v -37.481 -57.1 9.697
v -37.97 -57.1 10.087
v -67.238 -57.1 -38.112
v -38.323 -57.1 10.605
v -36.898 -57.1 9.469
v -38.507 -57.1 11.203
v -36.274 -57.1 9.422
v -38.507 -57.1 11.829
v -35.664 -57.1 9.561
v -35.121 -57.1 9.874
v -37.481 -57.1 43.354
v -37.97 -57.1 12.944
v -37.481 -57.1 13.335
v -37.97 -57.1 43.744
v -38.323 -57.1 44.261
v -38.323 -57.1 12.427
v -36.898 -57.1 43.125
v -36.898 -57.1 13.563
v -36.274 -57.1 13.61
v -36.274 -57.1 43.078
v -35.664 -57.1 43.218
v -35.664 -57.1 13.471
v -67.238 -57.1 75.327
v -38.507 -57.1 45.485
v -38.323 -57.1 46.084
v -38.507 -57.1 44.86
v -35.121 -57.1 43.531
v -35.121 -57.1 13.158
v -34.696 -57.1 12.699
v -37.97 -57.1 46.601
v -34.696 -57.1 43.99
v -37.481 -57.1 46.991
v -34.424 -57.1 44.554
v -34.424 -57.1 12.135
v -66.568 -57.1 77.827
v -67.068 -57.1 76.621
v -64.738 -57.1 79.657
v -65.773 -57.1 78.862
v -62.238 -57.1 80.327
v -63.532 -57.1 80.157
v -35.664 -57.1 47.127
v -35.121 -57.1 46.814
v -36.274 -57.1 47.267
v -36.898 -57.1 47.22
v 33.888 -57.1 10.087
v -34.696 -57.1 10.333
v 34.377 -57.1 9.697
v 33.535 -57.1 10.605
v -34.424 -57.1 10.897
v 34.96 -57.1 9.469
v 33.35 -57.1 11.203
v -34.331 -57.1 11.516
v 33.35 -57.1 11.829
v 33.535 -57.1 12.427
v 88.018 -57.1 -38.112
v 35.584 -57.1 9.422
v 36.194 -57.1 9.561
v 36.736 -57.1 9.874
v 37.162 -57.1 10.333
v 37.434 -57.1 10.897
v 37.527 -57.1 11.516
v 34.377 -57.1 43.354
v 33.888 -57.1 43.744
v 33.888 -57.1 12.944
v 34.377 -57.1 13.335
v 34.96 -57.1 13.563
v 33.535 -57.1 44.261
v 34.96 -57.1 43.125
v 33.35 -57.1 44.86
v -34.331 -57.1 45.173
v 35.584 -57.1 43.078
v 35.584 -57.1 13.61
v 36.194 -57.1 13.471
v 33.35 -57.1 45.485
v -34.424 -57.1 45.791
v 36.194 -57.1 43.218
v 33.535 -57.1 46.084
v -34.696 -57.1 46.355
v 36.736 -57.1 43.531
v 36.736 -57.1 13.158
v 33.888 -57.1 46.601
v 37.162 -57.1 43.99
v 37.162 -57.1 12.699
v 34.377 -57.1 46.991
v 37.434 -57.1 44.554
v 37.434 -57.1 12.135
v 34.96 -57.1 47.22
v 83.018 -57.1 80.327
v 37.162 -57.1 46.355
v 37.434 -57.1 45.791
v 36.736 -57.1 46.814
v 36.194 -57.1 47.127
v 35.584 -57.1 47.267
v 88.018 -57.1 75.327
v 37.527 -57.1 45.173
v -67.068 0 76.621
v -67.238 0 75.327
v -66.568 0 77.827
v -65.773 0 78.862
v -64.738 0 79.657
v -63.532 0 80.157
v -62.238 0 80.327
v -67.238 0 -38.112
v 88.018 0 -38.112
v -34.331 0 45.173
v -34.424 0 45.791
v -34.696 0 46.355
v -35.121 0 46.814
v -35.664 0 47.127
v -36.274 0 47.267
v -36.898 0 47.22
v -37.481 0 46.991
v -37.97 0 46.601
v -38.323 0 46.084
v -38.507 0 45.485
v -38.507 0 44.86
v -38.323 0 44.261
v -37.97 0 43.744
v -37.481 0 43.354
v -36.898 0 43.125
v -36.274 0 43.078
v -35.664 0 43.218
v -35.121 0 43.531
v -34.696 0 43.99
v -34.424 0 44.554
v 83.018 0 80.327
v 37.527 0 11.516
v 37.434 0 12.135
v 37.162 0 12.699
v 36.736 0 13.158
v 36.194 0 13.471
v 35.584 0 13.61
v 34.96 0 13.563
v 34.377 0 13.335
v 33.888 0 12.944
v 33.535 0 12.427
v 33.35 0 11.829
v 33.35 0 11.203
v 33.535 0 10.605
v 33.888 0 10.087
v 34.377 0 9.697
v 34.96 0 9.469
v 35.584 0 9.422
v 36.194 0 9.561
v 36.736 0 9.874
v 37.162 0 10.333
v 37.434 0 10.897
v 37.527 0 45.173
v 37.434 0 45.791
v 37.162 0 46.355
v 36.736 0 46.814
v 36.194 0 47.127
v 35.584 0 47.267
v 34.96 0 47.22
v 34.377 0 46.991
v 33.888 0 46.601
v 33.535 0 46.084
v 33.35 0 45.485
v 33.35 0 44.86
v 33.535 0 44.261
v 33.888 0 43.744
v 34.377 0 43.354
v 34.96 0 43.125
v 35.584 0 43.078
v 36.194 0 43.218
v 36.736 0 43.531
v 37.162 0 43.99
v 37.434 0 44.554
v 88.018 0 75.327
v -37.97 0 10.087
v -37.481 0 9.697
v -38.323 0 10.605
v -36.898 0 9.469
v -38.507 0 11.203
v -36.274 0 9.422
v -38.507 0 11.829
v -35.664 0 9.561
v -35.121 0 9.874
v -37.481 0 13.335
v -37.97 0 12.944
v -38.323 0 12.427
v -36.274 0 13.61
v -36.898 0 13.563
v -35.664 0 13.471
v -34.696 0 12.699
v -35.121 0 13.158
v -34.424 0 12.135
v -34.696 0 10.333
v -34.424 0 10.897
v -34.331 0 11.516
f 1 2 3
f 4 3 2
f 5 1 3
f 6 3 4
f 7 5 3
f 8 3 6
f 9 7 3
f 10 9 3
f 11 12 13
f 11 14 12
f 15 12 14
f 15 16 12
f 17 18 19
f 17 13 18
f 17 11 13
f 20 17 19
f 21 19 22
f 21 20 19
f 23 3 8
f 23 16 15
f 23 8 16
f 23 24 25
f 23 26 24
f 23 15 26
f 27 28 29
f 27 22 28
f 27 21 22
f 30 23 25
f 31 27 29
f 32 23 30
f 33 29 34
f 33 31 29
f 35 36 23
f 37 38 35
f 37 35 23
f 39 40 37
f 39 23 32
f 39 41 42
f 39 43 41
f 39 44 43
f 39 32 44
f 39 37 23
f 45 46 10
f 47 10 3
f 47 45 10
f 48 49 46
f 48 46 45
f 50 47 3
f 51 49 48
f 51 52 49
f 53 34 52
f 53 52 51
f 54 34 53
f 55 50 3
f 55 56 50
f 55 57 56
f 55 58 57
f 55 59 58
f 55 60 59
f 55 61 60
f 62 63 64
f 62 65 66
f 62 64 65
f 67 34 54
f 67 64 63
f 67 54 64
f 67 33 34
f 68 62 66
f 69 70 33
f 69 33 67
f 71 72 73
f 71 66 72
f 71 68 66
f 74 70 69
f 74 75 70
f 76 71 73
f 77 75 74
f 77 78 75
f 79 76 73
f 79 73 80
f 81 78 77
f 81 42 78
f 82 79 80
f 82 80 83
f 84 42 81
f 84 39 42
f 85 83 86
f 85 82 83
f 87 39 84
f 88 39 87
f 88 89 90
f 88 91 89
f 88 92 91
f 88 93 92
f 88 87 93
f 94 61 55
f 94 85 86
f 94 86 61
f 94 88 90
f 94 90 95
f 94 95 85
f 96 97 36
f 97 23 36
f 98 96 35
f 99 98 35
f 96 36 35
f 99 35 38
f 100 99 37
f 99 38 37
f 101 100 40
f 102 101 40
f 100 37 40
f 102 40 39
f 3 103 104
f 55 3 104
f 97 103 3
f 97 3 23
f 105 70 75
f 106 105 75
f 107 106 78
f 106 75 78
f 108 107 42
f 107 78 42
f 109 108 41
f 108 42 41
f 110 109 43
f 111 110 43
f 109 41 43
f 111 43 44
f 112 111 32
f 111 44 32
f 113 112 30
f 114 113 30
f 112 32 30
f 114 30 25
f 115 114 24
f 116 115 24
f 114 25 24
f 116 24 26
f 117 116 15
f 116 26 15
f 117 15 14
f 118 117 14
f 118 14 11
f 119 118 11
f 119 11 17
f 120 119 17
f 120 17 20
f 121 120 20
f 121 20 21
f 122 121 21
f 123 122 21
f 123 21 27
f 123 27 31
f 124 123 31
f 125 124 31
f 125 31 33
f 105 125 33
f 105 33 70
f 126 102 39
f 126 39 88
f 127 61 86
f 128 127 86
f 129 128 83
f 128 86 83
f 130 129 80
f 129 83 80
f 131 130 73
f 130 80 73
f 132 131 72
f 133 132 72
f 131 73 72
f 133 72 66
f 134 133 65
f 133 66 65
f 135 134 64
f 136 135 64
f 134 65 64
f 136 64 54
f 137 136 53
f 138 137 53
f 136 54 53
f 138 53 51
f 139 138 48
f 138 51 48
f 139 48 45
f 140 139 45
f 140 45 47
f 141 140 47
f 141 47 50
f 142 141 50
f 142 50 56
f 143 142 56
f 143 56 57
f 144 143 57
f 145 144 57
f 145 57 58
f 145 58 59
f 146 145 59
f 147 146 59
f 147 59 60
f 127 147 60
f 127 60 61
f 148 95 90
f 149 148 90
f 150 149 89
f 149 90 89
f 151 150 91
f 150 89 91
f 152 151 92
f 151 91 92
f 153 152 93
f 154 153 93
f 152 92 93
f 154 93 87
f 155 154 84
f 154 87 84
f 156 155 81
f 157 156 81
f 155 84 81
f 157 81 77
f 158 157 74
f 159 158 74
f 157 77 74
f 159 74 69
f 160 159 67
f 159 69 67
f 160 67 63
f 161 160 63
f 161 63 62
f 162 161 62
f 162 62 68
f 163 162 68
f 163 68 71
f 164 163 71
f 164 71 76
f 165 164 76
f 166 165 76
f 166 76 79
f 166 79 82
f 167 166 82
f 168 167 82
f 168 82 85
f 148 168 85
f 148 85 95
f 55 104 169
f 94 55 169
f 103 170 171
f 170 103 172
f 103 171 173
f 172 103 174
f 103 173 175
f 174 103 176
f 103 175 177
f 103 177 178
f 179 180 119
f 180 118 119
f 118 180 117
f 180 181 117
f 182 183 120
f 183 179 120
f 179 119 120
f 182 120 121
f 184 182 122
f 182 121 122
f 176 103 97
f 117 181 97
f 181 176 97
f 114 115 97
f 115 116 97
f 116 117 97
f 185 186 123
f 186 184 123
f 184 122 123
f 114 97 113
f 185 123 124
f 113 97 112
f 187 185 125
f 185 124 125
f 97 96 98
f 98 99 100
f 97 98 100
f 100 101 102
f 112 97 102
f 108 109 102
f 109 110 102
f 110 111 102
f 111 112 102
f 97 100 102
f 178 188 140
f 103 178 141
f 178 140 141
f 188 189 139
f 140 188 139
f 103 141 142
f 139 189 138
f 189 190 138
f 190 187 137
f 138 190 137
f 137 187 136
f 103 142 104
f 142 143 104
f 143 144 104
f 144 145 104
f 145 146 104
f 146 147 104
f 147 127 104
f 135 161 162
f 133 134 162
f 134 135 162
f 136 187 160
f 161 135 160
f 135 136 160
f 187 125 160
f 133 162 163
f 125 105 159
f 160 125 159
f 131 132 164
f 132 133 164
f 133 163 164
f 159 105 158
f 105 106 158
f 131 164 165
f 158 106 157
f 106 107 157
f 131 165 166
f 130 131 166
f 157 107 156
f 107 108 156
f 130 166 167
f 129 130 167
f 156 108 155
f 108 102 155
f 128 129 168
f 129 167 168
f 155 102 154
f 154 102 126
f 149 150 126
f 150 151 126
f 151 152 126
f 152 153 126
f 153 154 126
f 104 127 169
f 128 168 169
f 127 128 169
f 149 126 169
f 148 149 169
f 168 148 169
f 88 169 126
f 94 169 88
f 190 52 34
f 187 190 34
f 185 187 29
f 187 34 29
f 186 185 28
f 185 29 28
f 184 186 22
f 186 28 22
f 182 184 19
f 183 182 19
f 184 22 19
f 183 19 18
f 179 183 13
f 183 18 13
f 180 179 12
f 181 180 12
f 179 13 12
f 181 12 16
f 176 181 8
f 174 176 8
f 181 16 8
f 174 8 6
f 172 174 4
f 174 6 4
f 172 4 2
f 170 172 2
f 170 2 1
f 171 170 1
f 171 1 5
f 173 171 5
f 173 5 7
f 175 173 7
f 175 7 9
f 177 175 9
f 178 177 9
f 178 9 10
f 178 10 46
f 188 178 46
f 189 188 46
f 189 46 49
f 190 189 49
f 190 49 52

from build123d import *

# Parameters (mm, degrees)
F0_W     = 155.2556827664
F0_H     = 118.4387393296
F1_DEPTH = 57.1
F3_D     = 4.2
F4_R     = 5
F5_SIZE  = 5


with BuildPart() as f1:
    # F0 (on Front) → F1 (new body)
    with BuildSketch(Plane.XZ):
        with Locations((10.389957577, 21.1075376719)):
            Rectangle(F0_W, F0_H)
    extrude(amount=F1_DEPTH)

    # F3 (through all)
    with Locations(Plane(origin=(0, 0, 0), x_dir=(-1, 0, 0), z_dir=(0, 1, 0))):
        with Locations((-35.4269519448, 45.1725050807), (36.4308133721, 45.1725050807), (36.4308133721, 11.5158585832), (-35.4269519448, 11.5158585832)):
            Hole(F3_D / 2)

    # F4
    f4_edges = [f1.edges().sort_by_distance(p)[0] for p in [
        (-67.237884, -28.55, 80.326907),
    ]]
    fillet(f4_edges, radius=F4_R)

    # F5
    f5_edges = [f1.edges().sort_by_distance(p)[0] for p in [
        (88.017799, -28.55, 80.326907),
    ]]
    chamfer(f5_edges, length=F5_SIZE)


solid = f1.part
